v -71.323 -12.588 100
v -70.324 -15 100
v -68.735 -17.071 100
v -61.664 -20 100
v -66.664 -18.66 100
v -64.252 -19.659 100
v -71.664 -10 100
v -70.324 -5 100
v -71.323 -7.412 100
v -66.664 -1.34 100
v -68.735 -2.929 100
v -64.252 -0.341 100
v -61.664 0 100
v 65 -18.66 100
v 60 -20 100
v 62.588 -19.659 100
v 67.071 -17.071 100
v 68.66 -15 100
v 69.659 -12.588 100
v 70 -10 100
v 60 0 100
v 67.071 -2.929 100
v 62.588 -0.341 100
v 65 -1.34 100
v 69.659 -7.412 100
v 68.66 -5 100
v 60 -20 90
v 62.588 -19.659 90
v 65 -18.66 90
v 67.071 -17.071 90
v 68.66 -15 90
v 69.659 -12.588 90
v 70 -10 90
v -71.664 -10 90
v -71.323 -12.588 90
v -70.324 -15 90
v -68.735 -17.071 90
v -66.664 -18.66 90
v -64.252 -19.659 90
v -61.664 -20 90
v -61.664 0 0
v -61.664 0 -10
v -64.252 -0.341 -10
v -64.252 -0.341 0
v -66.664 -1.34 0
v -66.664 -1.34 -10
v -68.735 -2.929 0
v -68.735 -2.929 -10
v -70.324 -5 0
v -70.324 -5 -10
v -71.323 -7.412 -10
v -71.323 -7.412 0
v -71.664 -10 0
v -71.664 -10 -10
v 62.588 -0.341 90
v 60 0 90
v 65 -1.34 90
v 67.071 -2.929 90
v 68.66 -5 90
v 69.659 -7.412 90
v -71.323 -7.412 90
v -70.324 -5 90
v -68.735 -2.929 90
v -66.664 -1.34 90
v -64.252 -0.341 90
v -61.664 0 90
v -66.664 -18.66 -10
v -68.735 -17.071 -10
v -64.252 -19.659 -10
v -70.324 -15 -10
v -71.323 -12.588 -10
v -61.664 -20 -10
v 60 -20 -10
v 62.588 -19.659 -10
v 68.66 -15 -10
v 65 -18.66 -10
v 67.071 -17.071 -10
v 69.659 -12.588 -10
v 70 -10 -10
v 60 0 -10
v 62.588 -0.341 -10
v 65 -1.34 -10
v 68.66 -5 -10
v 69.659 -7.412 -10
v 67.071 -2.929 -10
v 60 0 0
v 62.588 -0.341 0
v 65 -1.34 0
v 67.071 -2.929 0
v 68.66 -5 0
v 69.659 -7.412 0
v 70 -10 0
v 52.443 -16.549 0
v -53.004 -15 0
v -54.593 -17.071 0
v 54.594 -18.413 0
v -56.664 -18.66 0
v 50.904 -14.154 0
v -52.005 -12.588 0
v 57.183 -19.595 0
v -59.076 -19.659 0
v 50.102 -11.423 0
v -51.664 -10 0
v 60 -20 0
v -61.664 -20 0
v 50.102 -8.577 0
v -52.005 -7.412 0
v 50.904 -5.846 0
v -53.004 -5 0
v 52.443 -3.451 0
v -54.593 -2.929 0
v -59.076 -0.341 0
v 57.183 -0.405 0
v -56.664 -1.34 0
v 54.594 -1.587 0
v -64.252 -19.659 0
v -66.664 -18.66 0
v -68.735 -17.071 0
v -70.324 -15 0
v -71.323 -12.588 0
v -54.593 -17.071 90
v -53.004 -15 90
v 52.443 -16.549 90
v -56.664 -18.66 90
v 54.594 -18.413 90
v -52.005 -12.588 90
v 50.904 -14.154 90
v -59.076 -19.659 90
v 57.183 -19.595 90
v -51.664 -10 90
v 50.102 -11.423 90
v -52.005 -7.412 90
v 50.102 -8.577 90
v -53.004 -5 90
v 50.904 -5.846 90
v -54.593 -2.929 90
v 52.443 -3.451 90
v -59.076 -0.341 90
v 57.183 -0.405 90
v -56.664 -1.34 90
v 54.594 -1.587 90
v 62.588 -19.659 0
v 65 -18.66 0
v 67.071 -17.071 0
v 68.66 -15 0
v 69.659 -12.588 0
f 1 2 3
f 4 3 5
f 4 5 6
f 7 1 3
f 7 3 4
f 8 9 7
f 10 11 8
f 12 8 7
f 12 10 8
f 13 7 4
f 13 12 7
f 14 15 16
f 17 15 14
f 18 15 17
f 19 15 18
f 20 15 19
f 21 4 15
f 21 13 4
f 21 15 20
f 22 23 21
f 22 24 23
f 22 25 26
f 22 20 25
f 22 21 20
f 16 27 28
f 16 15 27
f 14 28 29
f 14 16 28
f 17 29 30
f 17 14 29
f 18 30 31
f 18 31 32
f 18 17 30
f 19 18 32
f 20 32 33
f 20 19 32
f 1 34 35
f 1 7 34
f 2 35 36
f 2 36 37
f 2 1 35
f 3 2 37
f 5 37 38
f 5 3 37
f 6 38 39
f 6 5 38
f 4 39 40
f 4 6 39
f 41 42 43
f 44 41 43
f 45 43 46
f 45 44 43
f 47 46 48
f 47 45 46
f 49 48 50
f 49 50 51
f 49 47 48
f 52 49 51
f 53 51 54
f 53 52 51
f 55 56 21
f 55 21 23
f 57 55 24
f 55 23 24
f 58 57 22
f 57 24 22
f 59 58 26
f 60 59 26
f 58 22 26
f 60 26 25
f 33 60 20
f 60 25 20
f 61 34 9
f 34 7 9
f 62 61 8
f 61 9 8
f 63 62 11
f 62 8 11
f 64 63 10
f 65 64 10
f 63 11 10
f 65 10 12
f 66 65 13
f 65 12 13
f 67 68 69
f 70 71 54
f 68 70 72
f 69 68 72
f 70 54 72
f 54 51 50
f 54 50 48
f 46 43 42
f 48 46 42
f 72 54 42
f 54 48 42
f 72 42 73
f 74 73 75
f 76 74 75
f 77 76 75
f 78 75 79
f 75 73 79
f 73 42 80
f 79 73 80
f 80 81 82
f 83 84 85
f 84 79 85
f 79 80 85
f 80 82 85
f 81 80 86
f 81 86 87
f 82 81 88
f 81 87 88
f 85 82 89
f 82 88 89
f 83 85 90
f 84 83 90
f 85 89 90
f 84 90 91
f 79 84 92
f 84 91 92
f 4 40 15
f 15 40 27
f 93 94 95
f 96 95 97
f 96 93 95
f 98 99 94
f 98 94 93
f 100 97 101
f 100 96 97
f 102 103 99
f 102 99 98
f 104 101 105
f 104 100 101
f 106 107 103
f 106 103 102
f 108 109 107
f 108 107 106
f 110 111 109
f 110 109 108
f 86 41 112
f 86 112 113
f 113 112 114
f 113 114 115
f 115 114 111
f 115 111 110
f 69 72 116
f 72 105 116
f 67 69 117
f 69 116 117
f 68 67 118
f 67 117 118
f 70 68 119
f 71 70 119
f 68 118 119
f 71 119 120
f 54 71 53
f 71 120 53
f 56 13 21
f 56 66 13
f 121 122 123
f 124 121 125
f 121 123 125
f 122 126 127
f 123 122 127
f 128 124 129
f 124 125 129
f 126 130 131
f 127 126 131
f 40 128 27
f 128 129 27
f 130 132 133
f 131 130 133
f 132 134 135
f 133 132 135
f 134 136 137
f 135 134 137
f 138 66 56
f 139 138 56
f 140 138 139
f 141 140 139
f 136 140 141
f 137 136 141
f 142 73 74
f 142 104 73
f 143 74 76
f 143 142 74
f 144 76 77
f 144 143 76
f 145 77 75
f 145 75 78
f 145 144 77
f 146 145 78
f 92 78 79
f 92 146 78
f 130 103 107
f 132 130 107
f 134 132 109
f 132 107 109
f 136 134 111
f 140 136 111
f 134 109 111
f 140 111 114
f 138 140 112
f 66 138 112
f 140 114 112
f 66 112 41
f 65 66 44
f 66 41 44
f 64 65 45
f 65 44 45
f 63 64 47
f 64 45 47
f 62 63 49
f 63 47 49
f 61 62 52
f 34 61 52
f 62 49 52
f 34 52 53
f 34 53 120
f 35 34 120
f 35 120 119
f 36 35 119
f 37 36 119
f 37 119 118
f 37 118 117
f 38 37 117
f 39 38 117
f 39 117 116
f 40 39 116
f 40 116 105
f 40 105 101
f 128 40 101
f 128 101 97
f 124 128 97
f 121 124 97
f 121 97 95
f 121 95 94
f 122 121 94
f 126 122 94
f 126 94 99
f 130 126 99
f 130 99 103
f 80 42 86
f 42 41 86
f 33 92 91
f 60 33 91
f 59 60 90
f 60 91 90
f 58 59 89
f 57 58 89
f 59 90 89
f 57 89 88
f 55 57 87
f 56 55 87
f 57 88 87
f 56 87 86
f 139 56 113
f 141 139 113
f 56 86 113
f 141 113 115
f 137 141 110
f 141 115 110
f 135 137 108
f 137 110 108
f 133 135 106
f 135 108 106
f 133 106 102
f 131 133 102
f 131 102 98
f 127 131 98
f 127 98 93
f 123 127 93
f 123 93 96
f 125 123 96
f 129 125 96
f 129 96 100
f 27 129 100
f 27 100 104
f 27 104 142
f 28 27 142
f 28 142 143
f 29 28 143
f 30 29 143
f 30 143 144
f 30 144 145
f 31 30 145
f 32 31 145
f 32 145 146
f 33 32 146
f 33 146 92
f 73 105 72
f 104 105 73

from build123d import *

# Parameters (mm, degrees)
F0_W     = 141.6642213652
F0_H     = 10
F1_DEPTH = 20
F2_R     = 10
F3_DEPTH = 90
F4_W     = 141.6642213652
F4_H     = 20
F5_DEPTH = 10
F6_R     = 9.9999


# Not quite as in the source:
# - a fillet or chamfer is up to 0.001 mm smaller than in the source, because OpenCascade refuses the exact size


with BuildPart() as f1:
    # F0 (on Front) → F1 (new body)
    with BuildSketch(Plane.XZ):
        with Locations((-0.8321106826, -5)):
            Rectangle(F0_W, F0_H)
    extrude(amount=F1_DEPTH)

    # F2 (on face) → F3 (join)
    with BuildSketch(Plane.XY):
        with Locations((-61.6642213652, -10)):
            Circle(F2_R)
        with Locations((60, -10)):
            Circle(F2_R)
    extrude(amount=F3_DEPTH)

    # F4 (on face) → F5 (join)
    with BuildSketch(Plane.XY.offset(90)):
        with Locations((-0.8321106826, -10)):
            Rectangle(F4_W, F4_H)
    extrude(amount=F5_DEPTH)

    # F6 (radius 10 in the source; OpenCascade refuses exactly that, so slightly less here)
    f6_edges = [f1.edges().sort_by_distance(p)[0] for p in [
        (-71.664221, -20, -5),
        (-71.664221, 0, -5),
        (-71.664221, -20, 95),
        (-71.664221, 0, 95),
        (70, 0, 95),
        (70, -20, 95),
        (70, 0, -5),
        (70, -20, -5),
    ]]
    fillet(f6_edges, radius=F6_R)


solid = f1.part
